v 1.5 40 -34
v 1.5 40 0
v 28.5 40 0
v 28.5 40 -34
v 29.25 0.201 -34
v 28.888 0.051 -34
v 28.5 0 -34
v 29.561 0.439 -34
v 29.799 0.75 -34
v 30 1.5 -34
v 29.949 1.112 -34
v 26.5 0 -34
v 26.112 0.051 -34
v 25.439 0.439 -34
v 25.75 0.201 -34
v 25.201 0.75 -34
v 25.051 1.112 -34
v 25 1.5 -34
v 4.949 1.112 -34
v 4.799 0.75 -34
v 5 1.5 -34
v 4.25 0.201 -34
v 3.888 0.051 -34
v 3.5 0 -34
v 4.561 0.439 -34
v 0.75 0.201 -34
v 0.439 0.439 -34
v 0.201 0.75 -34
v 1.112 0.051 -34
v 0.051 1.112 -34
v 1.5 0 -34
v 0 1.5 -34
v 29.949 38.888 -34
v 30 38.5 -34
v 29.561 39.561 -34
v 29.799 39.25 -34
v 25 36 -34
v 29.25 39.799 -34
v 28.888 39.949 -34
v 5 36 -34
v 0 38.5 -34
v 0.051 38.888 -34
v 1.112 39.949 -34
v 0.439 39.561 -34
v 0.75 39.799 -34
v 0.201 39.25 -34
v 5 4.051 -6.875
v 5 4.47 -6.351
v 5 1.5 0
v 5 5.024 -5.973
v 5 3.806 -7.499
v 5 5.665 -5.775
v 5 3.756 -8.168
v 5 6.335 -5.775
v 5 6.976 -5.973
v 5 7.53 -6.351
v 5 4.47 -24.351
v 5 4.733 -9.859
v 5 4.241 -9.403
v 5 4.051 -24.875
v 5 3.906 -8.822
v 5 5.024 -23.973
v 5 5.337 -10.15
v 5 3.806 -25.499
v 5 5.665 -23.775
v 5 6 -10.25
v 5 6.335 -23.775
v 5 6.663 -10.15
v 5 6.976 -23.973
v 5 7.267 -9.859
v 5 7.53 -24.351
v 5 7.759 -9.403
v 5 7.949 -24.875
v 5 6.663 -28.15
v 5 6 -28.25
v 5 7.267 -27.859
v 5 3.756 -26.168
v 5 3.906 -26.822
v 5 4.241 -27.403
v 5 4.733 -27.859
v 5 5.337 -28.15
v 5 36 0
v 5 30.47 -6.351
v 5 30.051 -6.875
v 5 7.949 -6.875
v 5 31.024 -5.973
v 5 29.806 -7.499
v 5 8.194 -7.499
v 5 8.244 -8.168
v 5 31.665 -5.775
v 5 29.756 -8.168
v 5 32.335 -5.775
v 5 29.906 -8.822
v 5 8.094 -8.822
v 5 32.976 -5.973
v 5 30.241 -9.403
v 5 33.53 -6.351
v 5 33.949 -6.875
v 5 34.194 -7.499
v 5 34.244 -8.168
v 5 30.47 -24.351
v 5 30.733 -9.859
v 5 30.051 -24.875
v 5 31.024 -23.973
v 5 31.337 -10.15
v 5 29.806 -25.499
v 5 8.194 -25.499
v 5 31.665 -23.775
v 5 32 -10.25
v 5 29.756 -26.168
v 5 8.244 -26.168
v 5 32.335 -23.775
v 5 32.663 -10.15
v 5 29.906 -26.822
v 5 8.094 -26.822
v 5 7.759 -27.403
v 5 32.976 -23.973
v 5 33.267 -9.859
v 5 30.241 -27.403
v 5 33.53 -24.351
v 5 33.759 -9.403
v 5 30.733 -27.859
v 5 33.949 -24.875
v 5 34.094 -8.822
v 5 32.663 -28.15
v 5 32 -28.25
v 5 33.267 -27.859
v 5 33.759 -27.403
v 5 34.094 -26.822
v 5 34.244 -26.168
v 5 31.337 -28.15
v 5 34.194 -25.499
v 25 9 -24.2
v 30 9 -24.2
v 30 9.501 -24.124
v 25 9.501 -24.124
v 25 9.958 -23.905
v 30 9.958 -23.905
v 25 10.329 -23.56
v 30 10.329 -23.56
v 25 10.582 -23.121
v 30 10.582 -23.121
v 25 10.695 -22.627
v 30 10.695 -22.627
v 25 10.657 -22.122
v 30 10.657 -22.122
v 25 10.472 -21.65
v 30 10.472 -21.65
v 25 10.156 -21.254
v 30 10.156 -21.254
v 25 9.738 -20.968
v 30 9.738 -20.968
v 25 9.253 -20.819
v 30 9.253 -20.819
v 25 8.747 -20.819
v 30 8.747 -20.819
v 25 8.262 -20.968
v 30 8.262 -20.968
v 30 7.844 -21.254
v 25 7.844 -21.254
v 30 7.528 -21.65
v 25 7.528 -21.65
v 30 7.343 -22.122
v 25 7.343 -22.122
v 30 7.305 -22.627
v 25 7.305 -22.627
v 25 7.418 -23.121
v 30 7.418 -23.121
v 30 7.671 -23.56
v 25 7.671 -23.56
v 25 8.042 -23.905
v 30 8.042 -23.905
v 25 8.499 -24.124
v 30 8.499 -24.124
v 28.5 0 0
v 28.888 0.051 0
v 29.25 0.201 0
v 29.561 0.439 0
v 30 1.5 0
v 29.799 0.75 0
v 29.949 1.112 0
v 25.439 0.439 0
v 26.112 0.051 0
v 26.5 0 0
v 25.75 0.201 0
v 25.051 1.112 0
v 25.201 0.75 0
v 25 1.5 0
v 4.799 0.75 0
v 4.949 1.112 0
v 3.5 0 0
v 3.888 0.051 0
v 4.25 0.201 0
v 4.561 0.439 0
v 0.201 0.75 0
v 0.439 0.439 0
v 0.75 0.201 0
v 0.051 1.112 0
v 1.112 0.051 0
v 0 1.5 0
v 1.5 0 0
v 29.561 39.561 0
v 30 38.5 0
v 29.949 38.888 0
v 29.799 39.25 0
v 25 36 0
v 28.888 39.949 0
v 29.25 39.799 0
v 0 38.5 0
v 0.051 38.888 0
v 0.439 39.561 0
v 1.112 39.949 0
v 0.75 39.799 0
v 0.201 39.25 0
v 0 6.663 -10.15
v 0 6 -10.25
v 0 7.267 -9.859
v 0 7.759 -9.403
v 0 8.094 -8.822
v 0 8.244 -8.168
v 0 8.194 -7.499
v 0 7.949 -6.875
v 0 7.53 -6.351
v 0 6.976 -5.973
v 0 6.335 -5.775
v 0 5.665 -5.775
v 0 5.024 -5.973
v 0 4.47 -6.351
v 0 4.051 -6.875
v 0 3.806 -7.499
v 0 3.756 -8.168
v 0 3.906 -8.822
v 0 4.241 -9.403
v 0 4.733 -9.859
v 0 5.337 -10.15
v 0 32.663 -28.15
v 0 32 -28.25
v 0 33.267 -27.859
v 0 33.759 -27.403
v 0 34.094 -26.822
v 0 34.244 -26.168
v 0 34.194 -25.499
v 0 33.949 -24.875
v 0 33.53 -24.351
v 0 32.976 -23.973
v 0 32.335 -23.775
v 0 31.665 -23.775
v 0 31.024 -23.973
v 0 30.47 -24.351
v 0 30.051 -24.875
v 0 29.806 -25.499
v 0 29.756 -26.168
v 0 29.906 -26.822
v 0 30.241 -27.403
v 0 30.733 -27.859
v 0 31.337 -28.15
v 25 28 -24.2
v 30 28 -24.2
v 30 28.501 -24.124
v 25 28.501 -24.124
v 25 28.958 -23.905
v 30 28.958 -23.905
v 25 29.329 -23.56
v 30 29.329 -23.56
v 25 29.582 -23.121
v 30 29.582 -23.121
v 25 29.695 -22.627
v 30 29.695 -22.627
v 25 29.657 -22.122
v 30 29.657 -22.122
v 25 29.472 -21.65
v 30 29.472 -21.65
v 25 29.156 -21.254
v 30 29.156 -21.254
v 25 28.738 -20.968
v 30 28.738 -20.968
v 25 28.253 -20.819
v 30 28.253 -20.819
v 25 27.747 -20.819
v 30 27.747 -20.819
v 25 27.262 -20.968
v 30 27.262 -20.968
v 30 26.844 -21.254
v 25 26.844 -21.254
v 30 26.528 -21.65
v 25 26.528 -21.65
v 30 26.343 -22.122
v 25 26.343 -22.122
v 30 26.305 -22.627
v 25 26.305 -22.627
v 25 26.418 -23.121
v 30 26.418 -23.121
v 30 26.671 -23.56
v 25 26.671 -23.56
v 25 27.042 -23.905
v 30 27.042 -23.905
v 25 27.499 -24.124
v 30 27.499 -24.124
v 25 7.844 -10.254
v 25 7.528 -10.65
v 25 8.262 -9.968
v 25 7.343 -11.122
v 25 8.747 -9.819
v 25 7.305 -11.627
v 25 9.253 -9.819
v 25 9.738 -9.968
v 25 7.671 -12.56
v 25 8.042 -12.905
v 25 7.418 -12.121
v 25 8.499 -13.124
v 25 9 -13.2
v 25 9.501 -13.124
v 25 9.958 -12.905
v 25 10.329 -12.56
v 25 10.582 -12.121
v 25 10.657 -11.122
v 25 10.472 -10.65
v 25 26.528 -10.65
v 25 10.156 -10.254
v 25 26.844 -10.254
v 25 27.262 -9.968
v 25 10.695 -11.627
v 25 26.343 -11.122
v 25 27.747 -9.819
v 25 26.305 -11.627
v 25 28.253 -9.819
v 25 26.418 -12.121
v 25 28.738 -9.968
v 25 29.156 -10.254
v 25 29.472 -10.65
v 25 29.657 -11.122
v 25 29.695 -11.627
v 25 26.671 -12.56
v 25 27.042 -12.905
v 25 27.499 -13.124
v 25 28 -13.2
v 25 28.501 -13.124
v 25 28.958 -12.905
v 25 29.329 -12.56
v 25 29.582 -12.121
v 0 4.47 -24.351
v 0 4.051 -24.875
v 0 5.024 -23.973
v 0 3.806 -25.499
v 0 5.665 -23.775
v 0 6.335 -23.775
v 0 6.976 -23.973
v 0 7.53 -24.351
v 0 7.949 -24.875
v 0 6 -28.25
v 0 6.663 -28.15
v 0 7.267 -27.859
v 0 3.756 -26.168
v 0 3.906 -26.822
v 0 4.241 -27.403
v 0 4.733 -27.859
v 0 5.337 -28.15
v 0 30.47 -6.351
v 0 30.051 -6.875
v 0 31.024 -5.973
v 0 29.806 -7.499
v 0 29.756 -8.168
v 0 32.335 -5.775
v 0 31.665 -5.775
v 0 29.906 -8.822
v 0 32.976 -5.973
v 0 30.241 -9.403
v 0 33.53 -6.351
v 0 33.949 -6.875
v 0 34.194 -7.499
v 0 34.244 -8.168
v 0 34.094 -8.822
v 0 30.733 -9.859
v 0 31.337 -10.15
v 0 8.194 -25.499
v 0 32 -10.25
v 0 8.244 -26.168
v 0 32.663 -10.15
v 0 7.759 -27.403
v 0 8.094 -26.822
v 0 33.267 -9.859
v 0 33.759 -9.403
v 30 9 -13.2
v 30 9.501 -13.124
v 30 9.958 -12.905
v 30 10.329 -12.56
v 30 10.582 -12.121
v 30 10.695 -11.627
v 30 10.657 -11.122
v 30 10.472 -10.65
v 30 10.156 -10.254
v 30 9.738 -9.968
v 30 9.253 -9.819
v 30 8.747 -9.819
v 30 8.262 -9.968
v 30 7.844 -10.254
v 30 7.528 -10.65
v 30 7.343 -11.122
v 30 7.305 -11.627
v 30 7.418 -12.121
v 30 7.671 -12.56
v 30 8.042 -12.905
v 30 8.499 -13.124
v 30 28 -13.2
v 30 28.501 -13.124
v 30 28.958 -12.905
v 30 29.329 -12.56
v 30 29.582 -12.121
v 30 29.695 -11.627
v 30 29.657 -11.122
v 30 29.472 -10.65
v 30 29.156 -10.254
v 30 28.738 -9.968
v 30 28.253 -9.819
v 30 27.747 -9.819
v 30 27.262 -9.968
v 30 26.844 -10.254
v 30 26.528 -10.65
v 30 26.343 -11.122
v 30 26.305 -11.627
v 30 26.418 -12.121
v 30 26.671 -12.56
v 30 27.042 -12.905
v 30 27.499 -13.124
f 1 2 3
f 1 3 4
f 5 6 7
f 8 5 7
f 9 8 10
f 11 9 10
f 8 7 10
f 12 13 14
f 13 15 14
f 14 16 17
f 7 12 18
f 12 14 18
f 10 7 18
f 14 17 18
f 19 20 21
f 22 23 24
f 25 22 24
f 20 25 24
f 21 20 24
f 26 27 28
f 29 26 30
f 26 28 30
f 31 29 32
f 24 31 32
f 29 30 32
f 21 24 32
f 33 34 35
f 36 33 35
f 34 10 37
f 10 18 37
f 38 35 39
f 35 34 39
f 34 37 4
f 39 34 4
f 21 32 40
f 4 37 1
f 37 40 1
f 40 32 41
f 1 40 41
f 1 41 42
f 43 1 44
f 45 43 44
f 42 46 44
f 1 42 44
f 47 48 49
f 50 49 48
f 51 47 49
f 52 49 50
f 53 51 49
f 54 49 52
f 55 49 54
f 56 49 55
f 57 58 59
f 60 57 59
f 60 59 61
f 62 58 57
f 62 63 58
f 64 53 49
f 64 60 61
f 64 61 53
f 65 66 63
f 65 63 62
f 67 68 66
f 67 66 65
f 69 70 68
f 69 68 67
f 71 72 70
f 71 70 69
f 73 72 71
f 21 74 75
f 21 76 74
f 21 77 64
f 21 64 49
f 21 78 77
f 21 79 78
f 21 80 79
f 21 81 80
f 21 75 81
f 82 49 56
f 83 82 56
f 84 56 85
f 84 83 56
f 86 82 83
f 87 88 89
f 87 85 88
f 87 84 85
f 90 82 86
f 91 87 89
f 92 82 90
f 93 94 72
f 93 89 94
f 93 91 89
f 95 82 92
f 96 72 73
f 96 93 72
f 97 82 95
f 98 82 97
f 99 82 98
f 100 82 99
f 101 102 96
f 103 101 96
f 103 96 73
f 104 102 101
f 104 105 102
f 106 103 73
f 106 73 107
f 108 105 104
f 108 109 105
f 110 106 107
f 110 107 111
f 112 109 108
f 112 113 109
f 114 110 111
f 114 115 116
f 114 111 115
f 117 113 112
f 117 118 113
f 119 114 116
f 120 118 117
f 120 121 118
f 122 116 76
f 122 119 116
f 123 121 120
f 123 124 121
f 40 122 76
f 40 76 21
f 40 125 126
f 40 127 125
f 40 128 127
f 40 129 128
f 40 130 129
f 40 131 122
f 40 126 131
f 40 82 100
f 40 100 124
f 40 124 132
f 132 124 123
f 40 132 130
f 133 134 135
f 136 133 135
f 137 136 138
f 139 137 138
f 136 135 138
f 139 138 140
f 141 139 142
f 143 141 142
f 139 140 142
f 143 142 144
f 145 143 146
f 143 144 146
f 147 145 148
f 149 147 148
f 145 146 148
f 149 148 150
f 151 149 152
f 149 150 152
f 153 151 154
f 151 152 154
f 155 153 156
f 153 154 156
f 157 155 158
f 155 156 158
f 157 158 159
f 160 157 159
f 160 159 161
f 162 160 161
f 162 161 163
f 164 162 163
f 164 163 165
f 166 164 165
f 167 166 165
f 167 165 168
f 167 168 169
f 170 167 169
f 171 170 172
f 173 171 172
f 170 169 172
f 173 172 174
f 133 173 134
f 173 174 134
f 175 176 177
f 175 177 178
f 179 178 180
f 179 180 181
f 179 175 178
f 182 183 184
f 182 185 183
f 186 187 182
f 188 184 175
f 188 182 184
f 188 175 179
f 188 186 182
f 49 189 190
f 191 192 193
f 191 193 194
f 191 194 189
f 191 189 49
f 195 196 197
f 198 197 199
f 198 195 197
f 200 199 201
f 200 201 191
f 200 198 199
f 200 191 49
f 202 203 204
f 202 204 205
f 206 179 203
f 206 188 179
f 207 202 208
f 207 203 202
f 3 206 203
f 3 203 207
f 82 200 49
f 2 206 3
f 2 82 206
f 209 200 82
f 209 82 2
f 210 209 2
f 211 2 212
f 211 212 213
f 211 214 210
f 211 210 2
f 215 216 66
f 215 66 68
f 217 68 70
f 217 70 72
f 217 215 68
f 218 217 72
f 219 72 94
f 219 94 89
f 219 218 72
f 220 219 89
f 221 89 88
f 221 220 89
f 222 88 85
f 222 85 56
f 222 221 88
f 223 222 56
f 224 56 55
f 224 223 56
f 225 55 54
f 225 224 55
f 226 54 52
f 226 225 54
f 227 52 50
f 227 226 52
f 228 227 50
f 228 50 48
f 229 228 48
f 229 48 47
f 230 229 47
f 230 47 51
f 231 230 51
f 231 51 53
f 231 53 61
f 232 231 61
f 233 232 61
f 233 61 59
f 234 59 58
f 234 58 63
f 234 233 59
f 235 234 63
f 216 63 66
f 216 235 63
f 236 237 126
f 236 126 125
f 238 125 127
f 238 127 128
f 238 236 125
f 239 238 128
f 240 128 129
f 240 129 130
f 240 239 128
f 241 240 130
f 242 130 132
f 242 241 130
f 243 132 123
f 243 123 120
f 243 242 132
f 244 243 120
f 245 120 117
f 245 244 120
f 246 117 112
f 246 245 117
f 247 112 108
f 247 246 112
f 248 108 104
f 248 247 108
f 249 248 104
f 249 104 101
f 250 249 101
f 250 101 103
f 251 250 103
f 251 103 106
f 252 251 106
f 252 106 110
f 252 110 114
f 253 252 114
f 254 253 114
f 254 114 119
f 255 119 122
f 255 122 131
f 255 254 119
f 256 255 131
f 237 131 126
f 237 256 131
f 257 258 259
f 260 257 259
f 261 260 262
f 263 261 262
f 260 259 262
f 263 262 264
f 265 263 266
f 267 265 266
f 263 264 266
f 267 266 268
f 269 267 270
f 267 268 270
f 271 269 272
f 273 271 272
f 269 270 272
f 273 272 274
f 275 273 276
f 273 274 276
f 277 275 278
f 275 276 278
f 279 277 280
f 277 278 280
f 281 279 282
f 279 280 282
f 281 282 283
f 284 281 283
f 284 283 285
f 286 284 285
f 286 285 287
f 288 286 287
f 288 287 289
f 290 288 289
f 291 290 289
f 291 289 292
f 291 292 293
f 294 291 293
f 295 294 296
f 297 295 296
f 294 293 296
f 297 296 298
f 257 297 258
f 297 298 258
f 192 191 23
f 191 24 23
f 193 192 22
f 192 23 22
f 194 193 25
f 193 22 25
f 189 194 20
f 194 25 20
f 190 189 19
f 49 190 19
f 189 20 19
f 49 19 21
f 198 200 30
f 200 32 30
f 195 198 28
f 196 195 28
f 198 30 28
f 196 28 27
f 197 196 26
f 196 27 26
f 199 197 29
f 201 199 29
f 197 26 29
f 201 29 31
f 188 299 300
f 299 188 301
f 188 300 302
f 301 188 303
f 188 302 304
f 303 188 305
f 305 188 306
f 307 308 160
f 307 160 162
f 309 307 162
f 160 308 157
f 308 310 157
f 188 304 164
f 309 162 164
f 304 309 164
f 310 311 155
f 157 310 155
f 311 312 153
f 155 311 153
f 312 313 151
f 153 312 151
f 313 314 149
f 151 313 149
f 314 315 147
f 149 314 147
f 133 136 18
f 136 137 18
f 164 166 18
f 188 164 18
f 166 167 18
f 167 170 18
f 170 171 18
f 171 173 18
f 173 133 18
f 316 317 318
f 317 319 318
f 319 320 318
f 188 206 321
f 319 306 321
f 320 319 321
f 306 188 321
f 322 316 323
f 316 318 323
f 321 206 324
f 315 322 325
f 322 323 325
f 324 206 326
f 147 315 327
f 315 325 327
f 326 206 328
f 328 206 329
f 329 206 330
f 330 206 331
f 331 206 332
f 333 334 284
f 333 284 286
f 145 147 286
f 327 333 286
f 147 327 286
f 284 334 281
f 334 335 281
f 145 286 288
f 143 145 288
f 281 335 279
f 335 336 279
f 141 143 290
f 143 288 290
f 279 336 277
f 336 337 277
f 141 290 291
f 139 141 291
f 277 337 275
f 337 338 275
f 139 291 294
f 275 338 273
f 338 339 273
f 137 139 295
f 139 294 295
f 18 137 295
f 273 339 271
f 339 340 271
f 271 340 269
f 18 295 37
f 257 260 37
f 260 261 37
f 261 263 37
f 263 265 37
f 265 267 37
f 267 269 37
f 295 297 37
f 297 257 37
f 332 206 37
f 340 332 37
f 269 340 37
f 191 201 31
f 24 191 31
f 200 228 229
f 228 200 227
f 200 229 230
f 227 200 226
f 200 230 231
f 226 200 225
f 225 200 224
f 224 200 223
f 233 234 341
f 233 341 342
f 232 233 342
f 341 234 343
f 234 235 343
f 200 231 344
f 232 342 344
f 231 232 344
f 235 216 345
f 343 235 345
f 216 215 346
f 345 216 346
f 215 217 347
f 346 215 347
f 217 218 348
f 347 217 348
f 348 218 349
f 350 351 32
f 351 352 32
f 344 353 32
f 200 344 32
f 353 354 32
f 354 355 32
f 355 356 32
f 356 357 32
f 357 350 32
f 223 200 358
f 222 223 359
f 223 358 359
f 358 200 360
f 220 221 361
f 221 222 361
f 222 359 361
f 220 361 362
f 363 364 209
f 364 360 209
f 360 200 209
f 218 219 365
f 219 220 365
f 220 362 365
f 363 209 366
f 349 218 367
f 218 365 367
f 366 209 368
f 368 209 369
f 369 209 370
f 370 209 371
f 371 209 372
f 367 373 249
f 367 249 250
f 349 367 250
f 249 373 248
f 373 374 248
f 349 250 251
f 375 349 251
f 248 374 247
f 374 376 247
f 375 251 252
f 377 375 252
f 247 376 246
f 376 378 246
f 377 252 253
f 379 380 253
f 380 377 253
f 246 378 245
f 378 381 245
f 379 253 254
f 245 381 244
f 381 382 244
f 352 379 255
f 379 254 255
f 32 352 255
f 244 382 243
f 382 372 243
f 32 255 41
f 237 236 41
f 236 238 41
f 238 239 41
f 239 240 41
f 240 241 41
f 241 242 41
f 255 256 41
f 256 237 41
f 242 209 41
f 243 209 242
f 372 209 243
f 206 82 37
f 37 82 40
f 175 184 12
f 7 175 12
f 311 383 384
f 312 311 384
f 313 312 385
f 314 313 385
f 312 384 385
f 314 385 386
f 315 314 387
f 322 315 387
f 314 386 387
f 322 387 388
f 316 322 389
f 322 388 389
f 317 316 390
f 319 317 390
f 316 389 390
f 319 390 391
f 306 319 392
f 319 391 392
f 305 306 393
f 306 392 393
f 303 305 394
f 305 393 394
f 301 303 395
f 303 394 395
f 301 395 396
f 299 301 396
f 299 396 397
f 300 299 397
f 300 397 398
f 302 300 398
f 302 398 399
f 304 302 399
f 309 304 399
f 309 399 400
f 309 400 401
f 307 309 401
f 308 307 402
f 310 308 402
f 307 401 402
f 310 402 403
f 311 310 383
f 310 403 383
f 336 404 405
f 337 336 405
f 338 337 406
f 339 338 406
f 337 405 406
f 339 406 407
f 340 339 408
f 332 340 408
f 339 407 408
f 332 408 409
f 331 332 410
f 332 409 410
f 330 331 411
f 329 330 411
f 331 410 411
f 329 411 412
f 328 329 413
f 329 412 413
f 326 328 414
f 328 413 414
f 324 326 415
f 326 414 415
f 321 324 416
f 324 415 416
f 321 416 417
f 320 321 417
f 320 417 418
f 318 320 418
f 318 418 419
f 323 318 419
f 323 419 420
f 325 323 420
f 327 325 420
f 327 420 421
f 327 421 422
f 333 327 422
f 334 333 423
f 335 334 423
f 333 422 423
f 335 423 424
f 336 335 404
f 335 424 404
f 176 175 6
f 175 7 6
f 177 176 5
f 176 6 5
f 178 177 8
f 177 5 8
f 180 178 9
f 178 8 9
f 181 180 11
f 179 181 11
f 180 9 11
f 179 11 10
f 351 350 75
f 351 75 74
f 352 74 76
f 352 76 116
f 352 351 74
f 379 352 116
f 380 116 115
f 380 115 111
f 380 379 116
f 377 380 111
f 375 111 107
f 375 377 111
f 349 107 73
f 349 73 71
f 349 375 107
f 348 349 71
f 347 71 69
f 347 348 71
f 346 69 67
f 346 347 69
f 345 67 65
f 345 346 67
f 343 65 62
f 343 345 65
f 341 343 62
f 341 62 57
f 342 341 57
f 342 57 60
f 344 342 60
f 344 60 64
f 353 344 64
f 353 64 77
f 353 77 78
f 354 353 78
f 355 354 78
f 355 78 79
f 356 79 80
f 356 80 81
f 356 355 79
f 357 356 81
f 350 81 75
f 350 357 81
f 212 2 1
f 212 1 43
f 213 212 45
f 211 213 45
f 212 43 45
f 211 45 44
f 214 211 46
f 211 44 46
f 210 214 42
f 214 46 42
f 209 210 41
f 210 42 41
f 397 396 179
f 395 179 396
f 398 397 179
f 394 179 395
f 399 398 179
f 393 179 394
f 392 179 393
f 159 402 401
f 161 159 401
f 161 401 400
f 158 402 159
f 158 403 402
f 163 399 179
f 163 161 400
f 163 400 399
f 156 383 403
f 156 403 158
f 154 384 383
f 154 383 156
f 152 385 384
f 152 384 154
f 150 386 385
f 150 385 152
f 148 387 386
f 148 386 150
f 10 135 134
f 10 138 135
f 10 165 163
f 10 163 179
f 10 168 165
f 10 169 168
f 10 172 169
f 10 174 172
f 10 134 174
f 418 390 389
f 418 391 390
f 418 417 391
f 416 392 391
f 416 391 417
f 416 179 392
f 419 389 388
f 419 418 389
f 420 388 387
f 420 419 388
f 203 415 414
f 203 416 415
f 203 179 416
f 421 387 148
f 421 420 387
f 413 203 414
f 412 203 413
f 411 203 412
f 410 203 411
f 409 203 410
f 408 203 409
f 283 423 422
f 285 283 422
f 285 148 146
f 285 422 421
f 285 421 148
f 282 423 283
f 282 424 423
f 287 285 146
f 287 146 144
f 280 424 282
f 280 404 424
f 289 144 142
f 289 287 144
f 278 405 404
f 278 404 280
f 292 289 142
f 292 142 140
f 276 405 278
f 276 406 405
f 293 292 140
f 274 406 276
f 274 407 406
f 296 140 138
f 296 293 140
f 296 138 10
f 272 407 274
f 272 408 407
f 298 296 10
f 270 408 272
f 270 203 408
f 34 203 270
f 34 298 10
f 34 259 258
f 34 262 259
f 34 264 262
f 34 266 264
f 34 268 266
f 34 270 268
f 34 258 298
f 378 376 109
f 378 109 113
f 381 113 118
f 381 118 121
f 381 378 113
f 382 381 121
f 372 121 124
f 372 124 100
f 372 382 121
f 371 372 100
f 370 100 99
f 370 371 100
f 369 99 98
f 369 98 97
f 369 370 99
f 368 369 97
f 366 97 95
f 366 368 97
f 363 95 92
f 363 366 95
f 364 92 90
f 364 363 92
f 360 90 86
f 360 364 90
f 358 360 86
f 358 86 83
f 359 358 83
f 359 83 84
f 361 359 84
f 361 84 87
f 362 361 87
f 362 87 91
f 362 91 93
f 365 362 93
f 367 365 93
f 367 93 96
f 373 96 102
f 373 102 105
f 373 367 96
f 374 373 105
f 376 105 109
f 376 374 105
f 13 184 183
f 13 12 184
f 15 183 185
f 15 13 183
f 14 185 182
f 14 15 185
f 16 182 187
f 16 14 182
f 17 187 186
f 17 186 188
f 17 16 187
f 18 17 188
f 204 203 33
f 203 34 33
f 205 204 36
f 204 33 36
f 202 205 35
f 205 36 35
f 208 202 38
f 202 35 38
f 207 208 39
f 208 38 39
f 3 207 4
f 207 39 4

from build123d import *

# Parameters (mm, degrees)
SKETCH_1_W          = 34
SKETCH_1_H          = 40
SKETCH_1_R          = 2.25
EXTRUDE_1_DEPTH     = 5
SKETCH_2_W          = 34
SKETCH_2_H          = 4
EXTRUDE_2_DEPTH     = 20
SKETCH_3_W          = 34
SKETCH_3_H          = 40
EXTRUDE_3_DEPTH     = 5
SKETCH_4_R          = 1.7
CUT_EXTRUDE_1_DEPTH = 5
FILLET_1_R          = 1.5


with BuildPart() as part:
    # 草图1 → 凸台-拉伸1 (new body)
    with BuildSketch(Plane(origin=(0, 0, 0), x_dir=(0, 0, -1), z_dir=(1, 0, 0))):
        with Locations((17, 20)):
            Rectangle(SKETCH_1_W, SKETCH_1_H)
        with Locations((8, 32)):
            Circle(SKETCH_1_R, mode=Mode.SUBTRACT)
        with Locations((8, 6)):
            Circle(SKETCH_1_R, mode=Mode.SUBTRACT)
        with Locations((26, 32)):
            Circle(SKETCH_1_R, mode=Mode.SUBTRACT)
        with Locations((26, 6)):
            Circle(SKETCH_1_R, mode=Mode.SUBTRACT)
    extrude(amount=EXTRUDE_1_DEPTH)

    # 草图2 → 凸台-拉伸2 (add)
    with BuildSketch(Plane(origin=(5, 0, 0), x_dir=(0, 0, -1), z_dir=(1, 0, 0))):
        with Locations((17, 38)):
            Rectangle(SKETCH_2_W, SKETCH_2_H)
    extrude(amount=EXTRUDE_2_DEPTH)

    # 草图3 → 凸台-拉伸3 (add)
    with BuildSketch(Plane(origin=(25, 0, 0), x_dir=(0, 0, -1), z_dir=(1, 0, 0))):
        with Locations((17, 20)):
            Rectangle(SKETCH_3_W, SKETCH_3_H)
    extrude(amount=EXTRUDE_3_DEPTH)

    # 草图4 → 切除-拉伸1 (cut)
    with BuildSketch(Plane(origin=(30, 0, 0), x_dir=(0, 0, -1), z_dir=(1, 0, 0))):
        with Locations((11.5, 28)):
            Circle(SKETCH_4_R)
        with Locations((22.5, 28)):
            Circle(SKETCH_4_R)
        with Locations((11.5, 9)):
            Circle(SKETCH_4_R)
        with Locations((22.5, 9)):
            Circle(SKETCH_4_R)
    extrude(amount=-CUT_EXTRUDE_1_DEPTH, mode=Mode.SUBTRACT)

    # 圆角1
    fillet_1_edges = [part.edges().sort_by_distance(p)[0] for p in [
        (25, 0, -17),
        (30, 0, -17),
        (30, 40, -17),
        (0, 40, -17),
        (0, 0, -17),
        (5, 0, -17),
    ]]
    fillet(fillet_1_edges, radius=FILLET_1_R)


solid = part.part
